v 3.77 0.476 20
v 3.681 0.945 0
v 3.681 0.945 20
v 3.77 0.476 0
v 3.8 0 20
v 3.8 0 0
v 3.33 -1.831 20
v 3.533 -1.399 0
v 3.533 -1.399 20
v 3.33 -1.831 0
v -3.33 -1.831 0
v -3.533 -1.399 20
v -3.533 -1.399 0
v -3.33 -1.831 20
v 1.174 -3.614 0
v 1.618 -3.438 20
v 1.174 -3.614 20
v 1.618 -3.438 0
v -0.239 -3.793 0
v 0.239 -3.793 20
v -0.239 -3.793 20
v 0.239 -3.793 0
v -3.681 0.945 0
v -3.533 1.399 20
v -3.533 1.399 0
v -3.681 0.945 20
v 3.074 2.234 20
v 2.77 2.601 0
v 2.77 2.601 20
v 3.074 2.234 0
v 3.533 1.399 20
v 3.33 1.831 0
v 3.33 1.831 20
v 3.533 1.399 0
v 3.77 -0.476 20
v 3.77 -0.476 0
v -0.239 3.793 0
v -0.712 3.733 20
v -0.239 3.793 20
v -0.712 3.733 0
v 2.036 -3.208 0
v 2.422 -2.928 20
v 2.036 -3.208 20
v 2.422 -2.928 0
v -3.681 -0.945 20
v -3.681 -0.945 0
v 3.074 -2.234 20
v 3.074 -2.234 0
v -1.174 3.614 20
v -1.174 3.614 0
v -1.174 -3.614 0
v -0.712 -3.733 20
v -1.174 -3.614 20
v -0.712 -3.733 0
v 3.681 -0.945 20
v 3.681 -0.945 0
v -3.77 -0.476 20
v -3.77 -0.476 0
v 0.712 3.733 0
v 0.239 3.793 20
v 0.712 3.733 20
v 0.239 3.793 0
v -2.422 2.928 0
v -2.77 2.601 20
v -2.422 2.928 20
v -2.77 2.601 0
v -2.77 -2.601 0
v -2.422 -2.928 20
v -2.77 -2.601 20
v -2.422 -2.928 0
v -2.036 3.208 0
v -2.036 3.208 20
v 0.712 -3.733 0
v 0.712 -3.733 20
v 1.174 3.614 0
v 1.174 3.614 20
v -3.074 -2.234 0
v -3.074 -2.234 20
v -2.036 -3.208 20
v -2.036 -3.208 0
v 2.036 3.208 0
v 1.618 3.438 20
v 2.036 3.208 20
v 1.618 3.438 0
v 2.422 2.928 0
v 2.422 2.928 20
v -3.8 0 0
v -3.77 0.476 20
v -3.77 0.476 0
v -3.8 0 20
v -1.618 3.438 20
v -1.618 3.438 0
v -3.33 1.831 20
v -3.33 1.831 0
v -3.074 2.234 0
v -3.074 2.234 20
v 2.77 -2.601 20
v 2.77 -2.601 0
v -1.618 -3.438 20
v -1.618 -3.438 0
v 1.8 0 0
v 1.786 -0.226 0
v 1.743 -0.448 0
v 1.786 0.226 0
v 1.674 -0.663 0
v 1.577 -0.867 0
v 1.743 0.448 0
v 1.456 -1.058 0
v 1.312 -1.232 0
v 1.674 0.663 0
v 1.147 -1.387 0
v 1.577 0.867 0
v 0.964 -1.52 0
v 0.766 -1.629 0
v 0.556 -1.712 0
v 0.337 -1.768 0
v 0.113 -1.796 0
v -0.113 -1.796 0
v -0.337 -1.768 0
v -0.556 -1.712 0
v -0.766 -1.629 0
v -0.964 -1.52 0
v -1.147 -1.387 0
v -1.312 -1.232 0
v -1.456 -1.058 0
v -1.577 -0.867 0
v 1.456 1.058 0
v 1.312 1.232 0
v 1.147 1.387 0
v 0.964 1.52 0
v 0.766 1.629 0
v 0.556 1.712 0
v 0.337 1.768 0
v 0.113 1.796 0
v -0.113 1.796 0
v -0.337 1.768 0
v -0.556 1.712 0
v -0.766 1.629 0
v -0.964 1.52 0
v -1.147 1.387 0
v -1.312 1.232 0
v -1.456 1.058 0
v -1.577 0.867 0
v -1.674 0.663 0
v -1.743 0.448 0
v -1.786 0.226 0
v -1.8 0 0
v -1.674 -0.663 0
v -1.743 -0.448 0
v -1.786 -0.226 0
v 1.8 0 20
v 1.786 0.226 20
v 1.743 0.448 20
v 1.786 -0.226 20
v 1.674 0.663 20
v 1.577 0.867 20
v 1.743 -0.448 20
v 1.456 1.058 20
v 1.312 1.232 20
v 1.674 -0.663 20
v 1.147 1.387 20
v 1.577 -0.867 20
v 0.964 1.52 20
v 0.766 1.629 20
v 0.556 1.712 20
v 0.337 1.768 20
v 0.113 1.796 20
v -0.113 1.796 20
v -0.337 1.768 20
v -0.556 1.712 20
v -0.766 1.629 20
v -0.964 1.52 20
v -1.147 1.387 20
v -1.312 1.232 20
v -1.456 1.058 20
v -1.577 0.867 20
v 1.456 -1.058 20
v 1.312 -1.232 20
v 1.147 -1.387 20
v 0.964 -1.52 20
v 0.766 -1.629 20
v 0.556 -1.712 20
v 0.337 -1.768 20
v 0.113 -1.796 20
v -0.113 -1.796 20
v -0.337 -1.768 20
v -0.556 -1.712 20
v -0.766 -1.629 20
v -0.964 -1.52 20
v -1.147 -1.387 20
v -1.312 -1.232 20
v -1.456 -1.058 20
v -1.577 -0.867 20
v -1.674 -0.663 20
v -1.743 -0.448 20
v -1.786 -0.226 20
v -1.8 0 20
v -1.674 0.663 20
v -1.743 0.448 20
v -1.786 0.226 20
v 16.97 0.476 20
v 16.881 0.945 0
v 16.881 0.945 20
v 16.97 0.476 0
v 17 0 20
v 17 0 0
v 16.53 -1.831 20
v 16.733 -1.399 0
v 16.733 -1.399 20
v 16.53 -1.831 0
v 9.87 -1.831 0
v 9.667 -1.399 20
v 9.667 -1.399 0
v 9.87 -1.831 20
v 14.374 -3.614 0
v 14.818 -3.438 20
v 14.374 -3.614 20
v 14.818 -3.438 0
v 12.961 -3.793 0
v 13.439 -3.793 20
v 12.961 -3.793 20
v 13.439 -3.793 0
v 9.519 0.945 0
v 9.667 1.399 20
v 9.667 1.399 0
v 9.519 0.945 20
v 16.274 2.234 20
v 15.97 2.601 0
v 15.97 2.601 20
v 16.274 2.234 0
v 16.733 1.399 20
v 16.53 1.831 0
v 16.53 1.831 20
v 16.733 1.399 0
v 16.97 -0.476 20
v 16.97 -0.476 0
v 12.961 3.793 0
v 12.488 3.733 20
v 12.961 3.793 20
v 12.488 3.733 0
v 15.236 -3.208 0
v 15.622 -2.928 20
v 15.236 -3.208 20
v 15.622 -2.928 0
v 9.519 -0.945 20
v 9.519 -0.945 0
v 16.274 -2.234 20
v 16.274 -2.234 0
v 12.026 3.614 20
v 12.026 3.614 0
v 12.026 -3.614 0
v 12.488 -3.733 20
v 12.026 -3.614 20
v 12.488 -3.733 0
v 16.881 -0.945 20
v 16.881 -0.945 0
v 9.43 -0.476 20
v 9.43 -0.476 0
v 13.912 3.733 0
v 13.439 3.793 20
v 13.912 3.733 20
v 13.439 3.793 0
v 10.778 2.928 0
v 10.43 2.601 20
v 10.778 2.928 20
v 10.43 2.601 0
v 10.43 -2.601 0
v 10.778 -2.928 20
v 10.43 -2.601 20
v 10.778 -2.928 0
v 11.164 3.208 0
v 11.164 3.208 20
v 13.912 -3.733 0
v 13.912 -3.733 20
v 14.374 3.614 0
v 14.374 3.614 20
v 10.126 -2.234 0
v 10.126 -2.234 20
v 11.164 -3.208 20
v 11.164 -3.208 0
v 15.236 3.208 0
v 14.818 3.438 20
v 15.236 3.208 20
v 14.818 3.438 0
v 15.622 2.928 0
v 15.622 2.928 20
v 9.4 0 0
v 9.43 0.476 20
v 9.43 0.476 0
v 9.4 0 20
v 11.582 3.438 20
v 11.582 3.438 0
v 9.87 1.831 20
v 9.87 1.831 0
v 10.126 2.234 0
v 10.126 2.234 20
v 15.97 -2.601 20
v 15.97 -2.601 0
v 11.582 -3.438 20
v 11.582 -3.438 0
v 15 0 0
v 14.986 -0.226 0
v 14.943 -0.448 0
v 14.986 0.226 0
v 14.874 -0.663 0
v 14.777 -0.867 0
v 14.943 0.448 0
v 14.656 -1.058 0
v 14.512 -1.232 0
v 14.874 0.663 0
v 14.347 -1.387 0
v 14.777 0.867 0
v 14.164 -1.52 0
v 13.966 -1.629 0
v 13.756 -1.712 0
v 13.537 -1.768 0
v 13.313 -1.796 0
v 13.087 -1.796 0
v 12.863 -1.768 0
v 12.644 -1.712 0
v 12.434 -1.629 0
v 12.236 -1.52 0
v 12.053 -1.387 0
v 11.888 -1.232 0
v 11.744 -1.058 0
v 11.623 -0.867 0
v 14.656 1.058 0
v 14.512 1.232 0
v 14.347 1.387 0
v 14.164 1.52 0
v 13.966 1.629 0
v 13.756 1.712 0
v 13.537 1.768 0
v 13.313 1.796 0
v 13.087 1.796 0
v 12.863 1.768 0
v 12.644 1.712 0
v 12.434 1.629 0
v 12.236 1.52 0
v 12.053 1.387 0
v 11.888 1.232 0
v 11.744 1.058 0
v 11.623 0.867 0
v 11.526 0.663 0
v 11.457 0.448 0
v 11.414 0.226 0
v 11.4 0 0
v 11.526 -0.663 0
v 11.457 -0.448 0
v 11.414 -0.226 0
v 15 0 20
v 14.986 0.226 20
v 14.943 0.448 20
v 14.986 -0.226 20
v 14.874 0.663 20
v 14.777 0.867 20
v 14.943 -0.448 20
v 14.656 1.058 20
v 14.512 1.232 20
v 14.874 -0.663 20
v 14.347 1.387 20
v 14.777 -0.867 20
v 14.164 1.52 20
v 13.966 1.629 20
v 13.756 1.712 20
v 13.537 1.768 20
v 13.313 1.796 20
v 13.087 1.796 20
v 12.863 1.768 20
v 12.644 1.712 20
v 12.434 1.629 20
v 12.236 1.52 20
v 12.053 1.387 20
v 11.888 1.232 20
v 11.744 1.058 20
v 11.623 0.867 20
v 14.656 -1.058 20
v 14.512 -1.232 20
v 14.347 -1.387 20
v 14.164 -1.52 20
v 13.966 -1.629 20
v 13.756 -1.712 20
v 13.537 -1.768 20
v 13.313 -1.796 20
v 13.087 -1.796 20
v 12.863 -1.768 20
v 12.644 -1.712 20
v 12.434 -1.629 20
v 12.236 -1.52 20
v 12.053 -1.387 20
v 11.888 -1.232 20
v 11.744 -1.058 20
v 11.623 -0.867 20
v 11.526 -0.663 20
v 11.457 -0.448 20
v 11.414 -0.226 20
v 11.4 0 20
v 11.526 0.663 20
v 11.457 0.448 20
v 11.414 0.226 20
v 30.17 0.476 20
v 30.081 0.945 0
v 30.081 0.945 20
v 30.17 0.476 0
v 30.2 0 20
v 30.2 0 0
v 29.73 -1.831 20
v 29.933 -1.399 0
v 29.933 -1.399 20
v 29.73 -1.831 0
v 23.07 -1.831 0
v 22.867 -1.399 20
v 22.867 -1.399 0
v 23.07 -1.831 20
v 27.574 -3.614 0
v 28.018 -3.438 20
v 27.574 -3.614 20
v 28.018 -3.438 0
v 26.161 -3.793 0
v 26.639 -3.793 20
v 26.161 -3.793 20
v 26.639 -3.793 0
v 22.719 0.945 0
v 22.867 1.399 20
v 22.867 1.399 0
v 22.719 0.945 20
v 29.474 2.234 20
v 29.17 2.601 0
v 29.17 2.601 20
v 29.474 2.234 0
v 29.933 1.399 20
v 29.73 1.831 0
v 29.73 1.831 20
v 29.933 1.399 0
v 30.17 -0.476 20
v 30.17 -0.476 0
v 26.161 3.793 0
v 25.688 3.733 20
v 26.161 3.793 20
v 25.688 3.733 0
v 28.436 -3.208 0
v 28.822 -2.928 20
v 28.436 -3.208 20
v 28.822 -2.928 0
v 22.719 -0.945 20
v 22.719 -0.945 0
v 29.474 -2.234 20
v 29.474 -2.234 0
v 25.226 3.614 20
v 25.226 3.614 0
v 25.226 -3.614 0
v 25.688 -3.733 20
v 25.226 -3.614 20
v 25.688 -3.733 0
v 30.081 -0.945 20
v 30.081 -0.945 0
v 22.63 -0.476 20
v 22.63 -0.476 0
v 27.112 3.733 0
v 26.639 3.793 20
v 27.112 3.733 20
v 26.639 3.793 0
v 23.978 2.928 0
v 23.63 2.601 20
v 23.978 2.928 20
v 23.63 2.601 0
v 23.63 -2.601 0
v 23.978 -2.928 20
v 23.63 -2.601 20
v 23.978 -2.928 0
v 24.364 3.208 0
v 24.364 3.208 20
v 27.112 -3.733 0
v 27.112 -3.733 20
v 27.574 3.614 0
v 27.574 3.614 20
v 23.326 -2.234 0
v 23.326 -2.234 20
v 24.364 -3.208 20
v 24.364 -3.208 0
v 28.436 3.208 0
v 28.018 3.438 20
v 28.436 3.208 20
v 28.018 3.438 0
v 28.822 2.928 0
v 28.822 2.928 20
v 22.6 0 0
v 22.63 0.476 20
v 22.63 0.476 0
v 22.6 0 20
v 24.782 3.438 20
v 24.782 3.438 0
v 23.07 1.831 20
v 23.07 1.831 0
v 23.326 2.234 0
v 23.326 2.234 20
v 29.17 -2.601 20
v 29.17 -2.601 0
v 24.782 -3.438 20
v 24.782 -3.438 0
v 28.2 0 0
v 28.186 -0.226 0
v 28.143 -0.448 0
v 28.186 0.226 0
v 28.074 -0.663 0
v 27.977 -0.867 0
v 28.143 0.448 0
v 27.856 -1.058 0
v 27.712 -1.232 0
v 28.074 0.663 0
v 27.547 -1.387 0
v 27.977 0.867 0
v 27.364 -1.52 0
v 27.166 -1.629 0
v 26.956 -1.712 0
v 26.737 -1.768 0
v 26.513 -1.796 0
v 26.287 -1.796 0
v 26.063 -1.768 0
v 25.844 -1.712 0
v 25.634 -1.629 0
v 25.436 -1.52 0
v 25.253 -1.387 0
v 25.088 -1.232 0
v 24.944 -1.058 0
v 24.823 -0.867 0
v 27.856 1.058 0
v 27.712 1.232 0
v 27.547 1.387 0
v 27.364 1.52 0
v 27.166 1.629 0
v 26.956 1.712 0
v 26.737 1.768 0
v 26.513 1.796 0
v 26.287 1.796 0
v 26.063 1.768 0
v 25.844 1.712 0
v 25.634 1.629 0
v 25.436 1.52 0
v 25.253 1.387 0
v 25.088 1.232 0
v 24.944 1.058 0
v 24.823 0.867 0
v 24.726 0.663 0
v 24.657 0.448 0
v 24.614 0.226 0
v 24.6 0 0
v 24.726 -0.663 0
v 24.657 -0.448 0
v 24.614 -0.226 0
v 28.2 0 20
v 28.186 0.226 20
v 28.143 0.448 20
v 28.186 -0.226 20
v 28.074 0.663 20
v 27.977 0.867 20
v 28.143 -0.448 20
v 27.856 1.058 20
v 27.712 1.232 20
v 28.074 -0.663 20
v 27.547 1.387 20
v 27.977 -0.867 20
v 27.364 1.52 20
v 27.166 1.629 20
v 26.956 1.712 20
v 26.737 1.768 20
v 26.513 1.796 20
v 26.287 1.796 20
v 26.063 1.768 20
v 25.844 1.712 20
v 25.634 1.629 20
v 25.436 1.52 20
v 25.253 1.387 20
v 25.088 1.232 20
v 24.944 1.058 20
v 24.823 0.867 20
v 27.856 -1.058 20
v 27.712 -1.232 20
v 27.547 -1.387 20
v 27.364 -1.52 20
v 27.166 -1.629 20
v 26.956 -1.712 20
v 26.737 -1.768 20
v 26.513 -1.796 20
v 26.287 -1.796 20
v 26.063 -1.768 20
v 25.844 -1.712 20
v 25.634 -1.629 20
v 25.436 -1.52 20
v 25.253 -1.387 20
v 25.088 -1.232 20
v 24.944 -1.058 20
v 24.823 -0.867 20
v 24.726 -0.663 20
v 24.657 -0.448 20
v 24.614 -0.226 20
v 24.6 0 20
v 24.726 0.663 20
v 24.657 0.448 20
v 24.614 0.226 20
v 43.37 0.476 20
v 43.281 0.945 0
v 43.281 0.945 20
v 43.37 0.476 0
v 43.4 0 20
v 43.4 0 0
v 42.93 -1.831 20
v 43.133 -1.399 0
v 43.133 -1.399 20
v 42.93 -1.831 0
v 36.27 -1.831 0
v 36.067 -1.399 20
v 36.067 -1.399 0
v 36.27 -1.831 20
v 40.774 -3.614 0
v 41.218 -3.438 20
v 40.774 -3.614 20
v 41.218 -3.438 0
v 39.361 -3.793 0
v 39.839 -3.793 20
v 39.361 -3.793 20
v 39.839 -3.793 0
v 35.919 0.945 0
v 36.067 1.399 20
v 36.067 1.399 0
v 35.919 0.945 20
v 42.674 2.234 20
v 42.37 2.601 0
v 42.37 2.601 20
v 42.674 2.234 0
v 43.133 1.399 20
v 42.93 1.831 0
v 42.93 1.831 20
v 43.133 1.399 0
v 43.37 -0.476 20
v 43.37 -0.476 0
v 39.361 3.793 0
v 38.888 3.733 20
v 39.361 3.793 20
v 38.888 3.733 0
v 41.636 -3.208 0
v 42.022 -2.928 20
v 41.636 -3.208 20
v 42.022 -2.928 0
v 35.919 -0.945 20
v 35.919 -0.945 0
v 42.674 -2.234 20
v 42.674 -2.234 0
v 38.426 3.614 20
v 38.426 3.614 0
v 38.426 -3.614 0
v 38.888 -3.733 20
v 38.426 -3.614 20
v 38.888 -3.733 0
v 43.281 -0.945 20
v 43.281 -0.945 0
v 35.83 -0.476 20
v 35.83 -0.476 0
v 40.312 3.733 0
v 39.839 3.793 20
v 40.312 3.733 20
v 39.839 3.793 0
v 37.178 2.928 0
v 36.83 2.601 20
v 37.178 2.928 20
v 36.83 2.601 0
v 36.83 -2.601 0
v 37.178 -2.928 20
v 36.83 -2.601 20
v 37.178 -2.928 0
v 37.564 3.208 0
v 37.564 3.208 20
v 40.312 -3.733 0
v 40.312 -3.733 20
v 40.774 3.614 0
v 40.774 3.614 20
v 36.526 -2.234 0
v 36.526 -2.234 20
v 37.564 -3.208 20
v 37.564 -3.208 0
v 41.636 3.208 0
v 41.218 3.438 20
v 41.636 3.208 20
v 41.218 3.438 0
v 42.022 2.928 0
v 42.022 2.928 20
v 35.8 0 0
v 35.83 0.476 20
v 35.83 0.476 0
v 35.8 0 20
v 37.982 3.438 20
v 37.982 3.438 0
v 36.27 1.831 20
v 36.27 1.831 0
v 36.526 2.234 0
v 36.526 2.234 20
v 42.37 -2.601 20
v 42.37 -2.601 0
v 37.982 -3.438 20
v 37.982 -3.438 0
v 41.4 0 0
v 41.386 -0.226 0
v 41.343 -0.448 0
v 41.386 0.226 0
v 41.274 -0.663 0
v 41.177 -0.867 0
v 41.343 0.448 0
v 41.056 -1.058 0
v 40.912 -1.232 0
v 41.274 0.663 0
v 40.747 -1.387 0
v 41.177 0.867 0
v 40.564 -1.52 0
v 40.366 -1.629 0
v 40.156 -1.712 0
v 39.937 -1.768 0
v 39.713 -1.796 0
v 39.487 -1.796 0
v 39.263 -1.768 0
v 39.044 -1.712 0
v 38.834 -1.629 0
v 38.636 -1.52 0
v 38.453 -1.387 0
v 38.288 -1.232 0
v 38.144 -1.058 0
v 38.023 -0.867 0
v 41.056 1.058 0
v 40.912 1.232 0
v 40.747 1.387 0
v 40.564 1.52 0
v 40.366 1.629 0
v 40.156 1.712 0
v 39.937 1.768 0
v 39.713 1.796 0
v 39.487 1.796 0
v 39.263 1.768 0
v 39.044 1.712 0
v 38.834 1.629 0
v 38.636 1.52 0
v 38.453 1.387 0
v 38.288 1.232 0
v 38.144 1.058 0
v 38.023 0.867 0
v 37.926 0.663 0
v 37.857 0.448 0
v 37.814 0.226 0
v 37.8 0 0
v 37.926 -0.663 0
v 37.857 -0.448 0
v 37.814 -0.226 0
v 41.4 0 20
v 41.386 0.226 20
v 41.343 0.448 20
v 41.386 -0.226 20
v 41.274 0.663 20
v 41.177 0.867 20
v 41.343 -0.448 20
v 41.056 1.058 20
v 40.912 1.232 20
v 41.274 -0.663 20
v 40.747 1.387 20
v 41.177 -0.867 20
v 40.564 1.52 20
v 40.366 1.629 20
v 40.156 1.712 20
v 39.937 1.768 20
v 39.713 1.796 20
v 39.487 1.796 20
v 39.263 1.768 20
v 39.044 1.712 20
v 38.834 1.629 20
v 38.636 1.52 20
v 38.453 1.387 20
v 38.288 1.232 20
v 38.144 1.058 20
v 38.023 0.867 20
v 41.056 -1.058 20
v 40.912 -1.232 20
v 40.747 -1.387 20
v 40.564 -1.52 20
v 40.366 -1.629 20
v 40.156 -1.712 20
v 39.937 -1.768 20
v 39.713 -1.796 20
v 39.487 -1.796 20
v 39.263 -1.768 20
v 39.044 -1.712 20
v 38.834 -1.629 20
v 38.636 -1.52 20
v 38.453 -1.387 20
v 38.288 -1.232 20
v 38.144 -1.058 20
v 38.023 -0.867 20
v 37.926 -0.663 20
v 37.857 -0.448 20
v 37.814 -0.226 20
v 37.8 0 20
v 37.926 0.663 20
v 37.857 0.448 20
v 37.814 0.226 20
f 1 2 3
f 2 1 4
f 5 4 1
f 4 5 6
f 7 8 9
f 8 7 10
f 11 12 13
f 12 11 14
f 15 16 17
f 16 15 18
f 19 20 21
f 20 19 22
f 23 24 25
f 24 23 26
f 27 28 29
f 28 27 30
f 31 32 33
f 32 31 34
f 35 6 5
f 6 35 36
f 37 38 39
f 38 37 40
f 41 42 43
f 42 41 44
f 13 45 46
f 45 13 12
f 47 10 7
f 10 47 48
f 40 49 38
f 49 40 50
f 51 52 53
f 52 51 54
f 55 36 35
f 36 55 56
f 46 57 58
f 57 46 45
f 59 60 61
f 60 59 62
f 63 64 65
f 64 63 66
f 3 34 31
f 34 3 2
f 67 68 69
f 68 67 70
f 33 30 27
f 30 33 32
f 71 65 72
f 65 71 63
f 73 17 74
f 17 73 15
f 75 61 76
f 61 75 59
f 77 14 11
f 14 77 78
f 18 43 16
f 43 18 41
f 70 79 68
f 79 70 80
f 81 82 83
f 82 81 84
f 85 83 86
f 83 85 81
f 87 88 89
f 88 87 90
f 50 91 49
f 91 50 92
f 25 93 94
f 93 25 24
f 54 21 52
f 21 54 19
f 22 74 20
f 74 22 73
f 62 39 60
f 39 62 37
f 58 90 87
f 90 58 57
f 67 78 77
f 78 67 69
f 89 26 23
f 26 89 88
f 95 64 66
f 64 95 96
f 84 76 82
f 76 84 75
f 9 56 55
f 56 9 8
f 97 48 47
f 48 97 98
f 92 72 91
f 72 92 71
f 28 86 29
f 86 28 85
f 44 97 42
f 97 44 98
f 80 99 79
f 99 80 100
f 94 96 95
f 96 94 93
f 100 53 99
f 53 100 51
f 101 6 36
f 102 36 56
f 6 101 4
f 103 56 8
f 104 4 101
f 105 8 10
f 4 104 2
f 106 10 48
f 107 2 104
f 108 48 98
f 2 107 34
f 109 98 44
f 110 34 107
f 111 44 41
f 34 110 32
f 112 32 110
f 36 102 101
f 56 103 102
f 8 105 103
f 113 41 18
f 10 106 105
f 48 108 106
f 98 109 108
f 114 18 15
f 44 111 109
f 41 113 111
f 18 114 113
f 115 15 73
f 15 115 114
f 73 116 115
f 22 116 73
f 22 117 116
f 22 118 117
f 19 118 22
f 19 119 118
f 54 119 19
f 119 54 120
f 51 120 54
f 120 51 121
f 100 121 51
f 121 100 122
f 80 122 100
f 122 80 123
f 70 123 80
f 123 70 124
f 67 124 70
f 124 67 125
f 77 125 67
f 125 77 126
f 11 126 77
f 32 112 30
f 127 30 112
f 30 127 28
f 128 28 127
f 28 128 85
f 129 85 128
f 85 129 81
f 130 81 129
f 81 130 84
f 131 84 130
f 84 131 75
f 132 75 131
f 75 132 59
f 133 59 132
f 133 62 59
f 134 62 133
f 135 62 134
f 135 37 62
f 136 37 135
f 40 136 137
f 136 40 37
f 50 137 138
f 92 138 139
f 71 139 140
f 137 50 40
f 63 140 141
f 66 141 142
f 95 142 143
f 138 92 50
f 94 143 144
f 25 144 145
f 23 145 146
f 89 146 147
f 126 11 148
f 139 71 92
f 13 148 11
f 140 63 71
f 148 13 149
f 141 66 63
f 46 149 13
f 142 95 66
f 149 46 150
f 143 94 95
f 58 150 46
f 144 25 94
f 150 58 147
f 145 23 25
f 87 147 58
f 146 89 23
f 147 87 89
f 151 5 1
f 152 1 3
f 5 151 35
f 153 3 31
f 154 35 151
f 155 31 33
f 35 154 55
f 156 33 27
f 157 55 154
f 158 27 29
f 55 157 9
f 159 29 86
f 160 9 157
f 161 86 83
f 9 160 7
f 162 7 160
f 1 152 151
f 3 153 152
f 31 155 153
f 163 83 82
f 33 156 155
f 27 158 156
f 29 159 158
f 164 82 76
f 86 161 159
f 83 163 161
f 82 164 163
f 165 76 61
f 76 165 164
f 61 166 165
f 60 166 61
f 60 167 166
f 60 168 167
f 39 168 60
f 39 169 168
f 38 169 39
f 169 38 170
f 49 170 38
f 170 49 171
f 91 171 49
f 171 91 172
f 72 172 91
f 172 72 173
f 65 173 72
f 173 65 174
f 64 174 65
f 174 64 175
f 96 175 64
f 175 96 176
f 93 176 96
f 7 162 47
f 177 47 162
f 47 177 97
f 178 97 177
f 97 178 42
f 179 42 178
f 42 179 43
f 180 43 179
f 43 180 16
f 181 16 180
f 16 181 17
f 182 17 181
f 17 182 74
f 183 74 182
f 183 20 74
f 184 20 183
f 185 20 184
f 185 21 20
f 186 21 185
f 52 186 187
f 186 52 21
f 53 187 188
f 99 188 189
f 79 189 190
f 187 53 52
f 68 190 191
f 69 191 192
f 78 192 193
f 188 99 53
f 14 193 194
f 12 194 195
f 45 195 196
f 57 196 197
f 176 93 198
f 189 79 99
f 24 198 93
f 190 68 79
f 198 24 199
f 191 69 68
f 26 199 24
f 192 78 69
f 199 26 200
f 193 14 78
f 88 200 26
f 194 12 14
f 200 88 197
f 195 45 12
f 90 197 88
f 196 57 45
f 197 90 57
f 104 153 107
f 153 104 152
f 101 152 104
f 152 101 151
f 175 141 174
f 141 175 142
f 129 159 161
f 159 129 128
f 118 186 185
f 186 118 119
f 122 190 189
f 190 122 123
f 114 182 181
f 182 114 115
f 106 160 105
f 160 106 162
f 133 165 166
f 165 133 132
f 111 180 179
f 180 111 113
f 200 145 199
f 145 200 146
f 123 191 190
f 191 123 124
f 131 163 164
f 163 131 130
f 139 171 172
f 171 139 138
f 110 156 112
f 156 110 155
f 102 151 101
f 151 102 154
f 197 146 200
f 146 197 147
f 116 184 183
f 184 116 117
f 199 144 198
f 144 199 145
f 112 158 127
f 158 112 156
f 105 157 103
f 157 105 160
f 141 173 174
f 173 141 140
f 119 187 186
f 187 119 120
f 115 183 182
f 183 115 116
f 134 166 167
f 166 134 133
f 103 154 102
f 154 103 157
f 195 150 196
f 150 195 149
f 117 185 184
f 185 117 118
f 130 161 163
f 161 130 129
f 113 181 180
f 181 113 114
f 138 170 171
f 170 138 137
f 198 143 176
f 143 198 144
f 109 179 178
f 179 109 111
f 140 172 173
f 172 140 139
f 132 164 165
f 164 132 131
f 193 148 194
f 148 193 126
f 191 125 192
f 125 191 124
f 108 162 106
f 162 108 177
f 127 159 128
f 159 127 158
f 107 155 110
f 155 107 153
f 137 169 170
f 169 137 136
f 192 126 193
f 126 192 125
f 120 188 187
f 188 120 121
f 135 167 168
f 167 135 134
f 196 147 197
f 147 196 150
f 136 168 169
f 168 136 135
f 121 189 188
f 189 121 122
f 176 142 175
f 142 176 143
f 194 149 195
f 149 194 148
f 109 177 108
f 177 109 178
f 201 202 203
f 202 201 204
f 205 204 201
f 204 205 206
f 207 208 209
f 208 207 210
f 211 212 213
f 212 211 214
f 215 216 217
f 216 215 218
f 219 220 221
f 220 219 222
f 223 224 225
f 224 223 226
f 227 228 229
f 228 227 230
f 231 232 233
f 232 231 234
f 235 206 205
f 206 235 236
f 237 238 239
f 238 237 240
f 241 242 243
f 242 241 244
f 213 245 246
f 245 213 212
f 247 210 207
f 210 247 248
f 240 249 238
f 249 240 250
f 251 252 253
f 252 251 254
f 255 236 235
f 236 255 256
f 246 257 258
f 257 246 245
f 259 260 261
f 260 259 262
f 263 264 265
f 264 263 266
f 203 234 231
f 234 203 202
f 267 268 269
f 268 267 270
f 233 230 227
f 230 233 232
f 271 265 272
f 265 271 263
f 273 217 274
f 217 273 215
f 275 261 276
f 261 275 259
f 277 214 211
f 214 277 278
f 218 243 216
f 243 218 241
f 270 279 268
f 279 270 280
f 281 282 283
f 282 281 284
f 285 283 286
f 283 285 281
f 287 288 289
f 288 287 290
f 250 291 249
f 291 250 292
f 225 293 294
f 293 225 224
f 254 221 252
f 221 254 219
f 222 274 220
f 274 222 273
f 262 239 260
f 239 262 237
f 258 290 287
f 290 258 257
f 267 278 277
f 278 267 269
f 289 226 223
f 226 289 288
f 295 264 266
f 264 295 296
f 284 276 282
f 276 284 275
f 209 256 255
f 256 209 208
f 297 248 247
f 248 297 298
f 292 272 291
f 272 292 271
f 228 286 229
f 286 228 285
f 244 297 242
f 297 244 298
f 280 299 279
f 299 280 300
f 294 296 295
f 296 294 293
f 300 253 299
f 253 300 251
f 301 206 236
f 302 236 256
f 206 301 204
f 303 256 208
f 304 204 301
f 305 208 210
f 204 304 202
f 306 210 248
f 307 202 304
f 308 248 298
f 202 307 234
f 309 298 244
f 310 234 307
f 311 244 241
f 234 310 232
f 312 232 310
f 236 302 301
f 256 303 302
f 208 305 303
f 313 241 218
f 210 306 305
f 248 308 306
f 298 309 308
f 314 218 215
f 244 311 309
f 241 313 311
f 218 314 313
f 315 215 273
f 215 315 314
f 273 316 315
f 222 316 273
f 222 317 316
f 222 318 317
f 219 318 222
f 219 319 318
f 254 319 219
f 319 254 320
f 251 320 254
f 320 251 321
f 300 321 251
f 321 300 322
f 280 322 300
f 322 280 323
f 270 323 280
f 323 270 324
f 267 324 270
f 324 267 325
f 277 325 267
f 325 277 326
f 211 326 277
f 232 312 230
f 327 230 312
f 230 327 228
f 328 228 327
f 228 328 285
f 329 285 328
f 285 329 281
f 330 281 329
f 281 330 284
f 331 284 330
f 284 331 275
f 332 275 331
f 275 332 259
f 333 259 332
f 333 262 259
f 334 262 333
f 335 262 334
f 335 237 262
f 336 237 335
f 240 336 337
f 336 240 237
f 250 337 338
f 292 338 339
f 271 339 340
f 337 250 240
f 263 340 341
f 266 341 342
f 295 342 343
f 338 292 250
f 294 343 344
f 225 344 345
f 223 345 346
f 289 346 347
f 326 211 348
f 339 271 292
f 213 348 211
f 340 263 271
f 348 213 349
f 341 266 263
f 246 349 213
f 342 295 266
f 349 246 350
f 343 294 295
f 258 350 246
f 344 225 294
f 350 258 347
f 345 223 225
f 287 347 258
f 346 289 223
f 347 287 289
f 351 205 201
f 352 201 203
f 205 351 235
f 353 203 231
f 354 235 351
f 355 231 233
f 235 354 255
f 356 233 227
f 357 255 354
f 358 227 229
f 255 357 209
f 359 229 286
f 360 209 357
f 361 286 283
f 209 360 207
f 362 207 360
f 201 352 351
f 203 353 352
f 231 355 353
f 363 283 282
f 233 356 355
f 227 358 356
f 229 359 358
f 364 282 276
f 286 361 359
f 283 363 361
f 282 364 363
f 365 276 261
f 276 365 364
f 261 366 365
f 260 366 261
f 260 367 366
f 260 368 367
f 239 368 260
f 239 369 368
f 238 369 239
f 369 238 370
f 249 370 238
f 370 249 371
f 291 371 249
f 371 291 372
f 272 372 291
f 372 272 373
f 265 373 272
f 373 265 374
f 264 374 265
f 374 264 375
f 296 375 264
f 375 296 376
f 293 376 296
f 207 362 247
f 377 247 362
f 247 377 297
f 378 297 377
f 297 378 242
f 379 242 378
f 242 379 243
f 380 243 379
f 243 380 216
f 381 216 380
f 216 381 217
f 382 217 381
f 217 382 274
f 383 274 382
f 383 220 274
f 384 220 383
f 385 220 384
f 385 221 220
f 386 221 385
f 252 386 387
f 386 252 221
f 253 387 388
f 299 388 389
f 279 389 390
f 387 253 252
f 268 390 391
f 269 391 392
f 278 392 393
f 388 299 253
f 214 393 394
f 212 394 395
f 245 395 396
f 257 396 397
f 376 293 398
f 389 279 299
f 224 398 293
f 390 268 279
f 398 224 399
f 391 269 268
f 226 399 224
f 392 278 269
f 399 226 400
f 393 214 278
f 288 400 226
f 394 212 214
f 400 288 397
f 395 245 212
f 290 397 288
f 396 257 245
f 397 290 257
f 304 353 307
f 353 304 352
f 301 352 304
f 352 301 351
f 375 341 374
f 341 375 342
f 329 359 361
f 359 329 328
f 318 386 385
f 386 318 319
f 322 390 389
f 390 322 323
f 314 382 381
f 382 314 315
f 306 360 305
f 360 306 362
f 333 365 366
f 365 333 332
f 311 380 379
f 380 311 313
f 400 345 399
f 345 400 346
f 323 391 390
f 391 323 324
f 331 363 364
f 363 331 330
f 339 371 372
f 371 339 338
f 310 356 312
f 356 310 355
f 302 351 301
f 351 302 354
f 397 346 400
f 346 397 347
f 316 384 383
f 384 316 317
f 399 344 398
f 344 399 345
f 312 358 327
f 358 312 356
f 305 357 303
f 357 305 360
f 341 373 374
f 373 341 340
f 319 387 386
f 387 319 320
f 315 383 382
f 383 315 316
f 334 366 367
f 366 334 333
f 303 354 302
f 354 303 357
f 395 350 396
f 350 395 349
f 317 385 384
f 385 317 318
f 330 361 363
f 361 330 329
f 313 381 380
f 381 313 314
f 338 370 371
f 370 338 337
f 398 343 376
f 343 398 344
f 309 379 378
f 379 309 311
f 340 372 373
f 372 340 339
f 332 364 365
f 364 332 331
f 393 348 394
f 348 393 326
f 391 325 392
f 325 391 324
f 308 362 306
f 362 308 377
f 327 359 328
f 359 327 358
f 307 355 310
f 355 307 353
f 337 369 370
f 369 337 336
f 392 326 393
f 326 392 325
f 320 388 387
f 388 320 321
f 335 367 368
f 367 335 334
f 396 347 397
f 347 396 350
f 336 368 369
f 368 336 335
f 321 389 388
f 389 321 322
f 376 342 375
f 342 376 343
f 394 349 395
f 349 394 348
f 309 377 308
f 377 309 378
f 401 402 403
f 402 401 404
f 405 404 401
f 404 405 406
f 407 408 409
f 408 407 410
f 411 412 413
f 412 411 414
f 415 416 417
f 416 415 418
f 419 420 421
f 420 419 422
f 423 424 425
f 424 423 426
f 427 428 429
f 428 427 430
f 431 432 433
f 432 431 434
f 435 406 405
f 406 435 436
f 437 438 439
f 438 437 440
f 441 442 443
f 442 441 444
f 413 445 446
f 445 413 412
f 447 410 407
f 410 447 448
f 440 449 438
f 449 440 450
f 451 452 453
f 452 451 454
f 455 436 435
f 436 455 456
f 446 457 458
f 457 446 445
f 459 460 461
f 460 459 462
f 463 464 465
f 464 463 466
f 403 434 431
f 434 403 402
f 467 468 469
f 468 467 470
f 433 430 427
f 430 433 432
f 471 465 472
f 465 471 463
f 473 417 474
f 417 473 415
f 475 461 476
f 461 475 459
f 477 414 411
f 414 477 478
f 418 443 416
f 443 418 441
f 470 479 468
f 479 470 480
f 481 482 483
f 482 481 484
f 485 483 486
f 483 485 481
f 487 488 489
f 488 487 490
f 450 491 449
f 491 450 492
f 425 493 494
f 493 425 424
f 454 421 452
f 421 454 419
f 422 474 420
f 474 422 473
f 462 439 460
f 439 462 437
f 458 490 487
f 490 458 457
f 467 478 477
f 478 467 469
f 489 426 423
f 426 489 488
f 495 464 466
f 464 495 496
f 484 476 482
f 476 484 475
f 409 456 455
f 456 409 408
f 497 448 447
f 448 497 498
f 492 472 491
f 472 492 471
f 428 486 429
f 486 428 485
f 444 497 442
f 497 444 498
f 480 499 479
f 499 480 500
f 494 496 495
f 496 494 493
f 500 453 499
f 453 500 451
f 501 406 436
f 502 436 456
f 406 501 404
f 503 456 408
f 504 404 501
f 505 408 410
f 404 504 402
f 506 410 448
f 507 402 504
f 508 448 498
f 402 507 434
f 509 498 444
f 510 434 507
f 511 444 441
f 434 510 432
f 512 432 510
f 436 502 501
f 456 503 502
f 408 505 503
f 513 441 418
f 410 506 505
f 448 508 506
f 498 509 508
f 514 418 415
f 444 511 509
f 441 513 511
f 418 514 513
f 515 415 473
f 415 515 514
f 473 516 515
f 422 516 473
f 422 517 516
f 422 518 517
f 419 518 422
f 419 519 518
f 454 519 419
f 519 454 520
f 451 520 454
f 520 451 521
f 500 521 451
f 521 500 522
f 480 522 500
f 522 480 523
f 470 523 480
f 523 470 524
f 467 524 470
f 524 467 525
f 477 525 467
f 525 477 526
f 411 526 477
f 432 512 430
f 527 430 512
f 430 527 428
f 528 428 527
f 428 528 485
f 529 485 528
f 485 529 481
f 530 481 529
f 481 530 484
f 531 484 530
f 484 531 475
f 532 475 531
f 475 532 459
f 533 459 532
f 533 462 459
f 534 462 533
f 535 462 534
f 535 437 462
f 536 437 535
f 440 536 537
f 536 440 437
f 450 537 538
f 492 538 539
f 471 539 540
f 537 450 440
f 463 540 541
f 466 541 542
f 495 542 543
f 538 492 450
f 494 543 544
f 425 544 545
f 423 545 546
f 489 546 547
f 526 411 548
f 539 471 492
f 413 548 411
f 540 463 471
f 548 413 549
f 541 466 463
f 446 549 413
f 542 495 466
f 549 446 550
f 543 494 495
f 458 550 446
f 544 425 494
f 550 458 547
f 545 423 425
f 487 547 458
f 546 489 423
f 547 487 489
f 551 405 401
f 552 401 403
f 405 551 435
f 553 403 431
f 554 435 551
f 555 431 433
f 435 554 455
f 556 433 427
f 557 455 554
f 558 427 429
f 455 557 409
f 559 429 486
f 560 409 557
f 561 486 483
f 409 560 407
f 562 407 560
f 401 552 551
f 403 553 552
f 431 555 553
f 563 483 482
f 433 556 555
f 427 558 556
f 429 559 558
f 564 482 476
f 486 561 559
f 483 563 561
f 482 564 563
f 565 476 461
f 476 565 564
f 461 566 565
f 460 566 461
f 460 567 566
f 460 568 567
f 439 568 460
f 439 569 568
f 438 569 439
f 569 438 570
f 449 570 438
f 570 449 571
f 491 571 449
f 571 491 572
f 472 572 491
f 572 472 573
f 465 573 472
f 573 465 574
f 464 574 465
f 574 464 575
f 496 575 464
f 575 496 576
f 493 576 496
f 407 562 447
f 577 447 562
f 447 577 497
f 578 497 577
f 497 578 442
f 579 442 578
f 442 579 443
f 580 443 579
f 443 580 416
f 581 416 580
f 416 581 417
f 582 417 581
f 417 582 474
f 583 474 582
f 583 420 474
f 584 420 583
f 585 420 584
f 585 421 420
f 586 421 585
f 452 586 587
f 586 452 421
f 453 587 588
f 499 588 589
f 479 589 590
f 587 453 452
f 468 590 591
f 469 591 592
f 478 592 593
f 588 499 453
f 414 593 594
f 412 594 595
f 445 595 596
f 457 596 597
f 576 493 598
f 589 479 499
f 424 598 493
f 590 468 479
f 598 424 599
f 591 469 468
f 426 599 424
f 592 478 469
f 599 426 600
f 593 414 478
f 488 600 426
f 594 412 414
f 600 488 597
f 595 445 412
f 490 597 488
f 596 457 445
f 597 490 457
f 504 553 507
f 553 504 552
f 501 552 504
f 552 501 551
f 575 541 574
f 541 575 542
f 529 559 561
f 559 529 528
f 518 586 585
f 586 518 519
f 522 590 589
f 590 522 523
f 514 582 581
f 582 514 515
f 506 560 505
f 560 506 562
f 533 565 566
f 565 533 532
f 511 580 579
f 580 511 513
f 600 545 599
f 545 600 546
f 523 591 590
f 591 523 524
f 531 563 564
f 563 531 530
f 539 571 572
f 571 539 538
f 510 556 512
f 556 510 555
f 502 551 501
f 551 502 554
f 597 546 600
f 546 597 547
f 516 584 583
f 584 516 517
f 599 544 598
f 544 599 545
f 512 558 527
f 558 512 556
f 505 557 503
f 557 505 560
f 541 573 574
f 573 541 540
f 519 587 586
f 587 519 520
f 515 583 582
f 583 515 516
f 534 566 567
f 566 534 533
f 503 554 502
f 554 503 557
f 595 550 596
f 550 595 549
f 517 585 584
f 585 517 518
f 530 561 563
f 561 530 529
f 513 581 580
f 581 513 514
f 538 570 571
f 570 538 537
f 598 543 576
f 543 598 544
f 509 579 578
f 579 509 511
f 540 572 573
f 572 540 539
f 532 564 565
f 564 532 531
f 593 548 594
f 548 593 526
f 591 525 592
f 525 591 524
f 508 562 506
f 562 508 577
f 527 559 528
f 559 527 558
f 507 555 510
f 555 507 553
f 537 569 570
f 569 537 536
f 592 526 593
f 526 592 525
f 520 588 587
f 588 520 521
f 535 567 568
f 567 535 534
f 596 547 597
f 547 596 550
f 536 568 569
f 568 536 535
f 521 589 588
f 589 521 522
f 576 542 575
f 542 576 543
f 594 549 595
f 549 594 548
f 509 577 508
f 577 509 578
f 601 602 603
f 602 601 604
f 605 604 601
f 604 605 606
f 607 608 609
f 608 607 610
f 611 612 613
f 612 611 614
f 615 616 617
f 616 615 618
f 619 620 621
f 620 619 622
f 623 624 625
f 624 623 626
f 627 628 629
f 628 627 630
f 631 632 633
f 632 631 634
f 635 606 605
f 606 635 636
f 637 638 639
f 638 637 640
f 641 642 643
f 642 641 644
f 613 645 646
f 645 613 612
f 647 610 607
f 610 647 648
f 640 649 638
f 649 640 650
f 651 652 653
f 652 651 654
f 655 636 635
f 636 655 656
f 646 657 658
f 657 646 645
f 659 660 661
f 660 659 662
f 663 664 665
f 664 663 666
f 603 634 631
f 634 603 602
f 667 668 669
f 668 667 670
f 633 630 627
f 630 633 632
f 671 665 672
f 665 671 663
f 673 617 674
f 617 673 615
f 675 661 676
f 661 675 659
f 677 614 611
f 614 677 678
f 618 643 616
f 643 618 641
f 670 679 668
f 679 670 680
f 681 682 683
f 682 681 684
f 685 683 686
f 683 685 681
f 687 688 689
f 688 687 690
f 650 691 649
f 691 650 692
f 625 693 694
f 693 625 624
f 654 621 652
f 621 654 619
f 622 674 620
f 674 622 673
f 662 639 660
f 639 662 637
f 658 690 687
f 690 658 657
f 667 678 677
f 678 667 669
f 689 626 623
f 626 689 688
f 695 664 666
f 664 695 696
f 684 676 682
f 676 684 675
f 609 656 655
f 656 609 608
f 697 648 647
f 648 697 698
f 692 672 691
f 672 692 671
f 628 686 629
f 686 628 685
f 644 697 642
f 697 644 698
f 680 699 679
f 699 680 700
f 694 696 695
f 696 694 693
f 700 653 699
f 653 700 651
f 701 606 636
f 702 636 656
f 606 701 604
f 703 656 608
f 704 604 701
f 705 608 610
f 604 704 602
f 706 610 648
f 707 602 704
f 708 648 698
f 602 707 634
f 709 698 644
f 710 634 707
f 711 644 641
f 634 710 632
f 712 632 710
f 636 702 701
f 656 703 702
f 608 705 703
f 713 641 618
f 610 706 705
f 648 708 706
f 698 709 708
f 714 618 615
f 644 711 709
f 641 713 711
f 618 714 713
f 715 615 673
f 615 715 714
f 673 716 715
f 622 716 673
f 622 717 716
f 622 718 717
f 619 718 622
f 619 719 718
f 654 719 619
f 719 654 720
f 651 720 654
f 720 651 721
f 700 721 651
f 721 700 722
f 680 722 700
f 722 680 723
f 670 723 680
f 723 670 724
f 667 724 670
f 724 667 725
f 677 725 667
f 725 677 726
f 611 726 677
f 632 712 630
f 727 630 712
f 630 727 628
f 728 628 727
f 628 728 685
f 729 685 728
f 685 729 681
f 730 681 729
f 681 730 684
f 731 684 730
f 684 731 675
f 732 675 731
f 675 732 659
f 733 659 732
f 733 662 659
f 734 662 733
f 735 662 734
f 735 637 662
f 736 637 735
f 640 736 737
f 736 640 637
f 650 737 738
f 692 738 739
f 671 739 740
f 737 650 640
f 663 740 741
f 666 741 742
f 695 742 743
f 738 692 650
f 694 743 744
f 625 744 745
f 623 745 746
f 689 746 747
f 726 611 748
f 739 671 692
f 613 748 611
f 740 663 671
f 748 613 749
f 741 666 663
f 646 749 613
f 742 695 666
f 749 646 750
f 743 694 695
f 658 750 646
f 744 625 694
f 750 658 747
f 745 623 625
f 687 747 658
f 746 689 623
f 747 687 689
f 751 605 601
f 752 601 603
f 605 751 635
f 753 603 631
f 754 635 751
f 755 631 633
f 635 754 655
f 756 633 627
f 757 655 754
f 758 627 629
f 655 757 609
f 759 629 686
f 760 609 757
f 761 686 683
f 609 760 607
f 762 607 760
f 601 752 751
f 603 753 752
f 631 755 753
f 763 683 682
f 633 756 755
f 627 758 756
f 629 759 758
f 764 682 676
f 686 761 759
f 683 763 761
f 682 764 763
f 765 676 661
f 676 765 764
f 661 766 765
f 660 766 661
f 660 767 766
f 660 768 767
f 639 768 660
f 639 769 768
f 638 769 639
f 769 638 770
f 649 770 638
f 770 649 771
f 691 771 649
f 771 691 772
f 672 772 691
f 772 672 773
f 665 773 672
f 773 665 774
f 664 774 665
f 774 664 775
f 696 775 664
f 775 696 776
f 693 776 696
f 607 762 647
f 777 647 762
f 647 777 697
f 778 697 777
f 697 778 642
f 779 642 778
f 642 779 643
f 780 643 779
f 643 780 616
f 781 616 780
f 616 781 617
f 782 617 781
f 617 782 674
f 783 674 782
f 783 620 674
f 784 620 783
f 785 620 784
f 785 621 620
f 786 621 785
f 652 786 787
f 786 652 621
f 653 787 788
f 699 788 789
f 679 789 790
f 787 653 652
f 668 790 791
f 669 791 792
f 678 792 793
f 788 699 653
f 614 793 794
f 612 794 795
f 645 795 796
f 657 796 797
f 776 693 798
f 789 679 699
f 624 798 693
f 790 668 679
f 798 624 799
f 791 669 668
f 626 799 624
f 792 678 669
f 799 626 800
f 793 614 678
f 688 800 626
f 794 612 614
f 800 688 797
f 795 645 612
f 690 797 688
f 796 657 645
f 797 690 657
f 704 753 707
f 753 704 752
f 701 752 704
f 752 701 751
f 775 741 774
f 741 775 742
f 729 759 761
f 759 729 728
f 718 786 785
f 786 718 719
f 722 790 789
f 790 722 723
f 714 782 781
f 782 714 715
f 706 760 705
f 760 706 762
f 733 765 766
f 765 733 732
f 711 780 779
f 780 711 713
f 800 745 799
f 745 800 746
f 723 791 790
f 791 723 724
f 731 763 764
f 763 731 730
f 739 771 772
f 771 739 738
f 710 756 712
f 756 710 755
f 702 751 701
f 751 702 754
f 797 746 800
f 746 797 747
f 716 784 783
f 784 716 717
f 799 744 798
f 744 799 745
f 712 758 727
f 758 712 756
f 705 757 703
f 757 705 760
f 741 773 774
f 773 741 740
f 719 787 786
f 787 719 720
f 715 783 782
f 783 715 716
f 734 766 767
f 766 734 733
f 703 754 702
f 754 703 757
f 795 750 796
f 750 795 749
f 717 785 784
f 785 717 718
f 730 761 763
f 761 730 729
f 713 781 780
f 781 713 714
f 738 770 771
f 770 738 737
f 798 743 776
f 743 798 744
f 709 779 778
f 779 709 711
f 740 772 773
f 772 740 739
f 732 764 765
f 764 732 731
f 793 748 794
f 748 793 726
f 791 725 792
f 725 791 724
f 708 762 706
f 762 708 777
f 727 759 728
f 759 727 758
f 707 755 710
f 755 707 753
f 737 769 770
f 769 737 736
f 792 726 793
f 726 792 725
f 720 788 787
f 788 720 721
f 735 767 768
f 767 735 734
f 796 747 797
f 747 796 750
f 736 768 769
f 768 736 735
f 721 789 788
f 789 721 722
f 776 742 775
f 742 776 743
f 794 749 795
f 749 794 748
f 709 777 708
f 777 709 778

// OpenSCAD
/*
*  Name: screw-washer.scad
*  Description: washer ring
*  Author: Anhtien Nguyen
*  Date: Aug 24, 2018
*/

// inner diameter of washer, default is M3 screw
diameter=3;
// clearance 
gap=0.6; 
// wall thickness between inner & outter wall
thickness=2; 
//  height
height=20; 
// how many copies
qty = 4;

 for (x = [1:1:qty])
    {
    translate([(x-1)*(diameter+gap*2+thickness*2+5),0,0]) printWasher();
}

module printWasher(rad = (diameter+gap)/2,thick=thickness,height=height) {
    difference() {
        // outter circle
        cylinder(r=rad+thick,h=height,$fn=50);
        // inner circle
        translate([0,0,-1]) cylinder(r=rad,h=height+2,$fn=50);
    }
}
    
